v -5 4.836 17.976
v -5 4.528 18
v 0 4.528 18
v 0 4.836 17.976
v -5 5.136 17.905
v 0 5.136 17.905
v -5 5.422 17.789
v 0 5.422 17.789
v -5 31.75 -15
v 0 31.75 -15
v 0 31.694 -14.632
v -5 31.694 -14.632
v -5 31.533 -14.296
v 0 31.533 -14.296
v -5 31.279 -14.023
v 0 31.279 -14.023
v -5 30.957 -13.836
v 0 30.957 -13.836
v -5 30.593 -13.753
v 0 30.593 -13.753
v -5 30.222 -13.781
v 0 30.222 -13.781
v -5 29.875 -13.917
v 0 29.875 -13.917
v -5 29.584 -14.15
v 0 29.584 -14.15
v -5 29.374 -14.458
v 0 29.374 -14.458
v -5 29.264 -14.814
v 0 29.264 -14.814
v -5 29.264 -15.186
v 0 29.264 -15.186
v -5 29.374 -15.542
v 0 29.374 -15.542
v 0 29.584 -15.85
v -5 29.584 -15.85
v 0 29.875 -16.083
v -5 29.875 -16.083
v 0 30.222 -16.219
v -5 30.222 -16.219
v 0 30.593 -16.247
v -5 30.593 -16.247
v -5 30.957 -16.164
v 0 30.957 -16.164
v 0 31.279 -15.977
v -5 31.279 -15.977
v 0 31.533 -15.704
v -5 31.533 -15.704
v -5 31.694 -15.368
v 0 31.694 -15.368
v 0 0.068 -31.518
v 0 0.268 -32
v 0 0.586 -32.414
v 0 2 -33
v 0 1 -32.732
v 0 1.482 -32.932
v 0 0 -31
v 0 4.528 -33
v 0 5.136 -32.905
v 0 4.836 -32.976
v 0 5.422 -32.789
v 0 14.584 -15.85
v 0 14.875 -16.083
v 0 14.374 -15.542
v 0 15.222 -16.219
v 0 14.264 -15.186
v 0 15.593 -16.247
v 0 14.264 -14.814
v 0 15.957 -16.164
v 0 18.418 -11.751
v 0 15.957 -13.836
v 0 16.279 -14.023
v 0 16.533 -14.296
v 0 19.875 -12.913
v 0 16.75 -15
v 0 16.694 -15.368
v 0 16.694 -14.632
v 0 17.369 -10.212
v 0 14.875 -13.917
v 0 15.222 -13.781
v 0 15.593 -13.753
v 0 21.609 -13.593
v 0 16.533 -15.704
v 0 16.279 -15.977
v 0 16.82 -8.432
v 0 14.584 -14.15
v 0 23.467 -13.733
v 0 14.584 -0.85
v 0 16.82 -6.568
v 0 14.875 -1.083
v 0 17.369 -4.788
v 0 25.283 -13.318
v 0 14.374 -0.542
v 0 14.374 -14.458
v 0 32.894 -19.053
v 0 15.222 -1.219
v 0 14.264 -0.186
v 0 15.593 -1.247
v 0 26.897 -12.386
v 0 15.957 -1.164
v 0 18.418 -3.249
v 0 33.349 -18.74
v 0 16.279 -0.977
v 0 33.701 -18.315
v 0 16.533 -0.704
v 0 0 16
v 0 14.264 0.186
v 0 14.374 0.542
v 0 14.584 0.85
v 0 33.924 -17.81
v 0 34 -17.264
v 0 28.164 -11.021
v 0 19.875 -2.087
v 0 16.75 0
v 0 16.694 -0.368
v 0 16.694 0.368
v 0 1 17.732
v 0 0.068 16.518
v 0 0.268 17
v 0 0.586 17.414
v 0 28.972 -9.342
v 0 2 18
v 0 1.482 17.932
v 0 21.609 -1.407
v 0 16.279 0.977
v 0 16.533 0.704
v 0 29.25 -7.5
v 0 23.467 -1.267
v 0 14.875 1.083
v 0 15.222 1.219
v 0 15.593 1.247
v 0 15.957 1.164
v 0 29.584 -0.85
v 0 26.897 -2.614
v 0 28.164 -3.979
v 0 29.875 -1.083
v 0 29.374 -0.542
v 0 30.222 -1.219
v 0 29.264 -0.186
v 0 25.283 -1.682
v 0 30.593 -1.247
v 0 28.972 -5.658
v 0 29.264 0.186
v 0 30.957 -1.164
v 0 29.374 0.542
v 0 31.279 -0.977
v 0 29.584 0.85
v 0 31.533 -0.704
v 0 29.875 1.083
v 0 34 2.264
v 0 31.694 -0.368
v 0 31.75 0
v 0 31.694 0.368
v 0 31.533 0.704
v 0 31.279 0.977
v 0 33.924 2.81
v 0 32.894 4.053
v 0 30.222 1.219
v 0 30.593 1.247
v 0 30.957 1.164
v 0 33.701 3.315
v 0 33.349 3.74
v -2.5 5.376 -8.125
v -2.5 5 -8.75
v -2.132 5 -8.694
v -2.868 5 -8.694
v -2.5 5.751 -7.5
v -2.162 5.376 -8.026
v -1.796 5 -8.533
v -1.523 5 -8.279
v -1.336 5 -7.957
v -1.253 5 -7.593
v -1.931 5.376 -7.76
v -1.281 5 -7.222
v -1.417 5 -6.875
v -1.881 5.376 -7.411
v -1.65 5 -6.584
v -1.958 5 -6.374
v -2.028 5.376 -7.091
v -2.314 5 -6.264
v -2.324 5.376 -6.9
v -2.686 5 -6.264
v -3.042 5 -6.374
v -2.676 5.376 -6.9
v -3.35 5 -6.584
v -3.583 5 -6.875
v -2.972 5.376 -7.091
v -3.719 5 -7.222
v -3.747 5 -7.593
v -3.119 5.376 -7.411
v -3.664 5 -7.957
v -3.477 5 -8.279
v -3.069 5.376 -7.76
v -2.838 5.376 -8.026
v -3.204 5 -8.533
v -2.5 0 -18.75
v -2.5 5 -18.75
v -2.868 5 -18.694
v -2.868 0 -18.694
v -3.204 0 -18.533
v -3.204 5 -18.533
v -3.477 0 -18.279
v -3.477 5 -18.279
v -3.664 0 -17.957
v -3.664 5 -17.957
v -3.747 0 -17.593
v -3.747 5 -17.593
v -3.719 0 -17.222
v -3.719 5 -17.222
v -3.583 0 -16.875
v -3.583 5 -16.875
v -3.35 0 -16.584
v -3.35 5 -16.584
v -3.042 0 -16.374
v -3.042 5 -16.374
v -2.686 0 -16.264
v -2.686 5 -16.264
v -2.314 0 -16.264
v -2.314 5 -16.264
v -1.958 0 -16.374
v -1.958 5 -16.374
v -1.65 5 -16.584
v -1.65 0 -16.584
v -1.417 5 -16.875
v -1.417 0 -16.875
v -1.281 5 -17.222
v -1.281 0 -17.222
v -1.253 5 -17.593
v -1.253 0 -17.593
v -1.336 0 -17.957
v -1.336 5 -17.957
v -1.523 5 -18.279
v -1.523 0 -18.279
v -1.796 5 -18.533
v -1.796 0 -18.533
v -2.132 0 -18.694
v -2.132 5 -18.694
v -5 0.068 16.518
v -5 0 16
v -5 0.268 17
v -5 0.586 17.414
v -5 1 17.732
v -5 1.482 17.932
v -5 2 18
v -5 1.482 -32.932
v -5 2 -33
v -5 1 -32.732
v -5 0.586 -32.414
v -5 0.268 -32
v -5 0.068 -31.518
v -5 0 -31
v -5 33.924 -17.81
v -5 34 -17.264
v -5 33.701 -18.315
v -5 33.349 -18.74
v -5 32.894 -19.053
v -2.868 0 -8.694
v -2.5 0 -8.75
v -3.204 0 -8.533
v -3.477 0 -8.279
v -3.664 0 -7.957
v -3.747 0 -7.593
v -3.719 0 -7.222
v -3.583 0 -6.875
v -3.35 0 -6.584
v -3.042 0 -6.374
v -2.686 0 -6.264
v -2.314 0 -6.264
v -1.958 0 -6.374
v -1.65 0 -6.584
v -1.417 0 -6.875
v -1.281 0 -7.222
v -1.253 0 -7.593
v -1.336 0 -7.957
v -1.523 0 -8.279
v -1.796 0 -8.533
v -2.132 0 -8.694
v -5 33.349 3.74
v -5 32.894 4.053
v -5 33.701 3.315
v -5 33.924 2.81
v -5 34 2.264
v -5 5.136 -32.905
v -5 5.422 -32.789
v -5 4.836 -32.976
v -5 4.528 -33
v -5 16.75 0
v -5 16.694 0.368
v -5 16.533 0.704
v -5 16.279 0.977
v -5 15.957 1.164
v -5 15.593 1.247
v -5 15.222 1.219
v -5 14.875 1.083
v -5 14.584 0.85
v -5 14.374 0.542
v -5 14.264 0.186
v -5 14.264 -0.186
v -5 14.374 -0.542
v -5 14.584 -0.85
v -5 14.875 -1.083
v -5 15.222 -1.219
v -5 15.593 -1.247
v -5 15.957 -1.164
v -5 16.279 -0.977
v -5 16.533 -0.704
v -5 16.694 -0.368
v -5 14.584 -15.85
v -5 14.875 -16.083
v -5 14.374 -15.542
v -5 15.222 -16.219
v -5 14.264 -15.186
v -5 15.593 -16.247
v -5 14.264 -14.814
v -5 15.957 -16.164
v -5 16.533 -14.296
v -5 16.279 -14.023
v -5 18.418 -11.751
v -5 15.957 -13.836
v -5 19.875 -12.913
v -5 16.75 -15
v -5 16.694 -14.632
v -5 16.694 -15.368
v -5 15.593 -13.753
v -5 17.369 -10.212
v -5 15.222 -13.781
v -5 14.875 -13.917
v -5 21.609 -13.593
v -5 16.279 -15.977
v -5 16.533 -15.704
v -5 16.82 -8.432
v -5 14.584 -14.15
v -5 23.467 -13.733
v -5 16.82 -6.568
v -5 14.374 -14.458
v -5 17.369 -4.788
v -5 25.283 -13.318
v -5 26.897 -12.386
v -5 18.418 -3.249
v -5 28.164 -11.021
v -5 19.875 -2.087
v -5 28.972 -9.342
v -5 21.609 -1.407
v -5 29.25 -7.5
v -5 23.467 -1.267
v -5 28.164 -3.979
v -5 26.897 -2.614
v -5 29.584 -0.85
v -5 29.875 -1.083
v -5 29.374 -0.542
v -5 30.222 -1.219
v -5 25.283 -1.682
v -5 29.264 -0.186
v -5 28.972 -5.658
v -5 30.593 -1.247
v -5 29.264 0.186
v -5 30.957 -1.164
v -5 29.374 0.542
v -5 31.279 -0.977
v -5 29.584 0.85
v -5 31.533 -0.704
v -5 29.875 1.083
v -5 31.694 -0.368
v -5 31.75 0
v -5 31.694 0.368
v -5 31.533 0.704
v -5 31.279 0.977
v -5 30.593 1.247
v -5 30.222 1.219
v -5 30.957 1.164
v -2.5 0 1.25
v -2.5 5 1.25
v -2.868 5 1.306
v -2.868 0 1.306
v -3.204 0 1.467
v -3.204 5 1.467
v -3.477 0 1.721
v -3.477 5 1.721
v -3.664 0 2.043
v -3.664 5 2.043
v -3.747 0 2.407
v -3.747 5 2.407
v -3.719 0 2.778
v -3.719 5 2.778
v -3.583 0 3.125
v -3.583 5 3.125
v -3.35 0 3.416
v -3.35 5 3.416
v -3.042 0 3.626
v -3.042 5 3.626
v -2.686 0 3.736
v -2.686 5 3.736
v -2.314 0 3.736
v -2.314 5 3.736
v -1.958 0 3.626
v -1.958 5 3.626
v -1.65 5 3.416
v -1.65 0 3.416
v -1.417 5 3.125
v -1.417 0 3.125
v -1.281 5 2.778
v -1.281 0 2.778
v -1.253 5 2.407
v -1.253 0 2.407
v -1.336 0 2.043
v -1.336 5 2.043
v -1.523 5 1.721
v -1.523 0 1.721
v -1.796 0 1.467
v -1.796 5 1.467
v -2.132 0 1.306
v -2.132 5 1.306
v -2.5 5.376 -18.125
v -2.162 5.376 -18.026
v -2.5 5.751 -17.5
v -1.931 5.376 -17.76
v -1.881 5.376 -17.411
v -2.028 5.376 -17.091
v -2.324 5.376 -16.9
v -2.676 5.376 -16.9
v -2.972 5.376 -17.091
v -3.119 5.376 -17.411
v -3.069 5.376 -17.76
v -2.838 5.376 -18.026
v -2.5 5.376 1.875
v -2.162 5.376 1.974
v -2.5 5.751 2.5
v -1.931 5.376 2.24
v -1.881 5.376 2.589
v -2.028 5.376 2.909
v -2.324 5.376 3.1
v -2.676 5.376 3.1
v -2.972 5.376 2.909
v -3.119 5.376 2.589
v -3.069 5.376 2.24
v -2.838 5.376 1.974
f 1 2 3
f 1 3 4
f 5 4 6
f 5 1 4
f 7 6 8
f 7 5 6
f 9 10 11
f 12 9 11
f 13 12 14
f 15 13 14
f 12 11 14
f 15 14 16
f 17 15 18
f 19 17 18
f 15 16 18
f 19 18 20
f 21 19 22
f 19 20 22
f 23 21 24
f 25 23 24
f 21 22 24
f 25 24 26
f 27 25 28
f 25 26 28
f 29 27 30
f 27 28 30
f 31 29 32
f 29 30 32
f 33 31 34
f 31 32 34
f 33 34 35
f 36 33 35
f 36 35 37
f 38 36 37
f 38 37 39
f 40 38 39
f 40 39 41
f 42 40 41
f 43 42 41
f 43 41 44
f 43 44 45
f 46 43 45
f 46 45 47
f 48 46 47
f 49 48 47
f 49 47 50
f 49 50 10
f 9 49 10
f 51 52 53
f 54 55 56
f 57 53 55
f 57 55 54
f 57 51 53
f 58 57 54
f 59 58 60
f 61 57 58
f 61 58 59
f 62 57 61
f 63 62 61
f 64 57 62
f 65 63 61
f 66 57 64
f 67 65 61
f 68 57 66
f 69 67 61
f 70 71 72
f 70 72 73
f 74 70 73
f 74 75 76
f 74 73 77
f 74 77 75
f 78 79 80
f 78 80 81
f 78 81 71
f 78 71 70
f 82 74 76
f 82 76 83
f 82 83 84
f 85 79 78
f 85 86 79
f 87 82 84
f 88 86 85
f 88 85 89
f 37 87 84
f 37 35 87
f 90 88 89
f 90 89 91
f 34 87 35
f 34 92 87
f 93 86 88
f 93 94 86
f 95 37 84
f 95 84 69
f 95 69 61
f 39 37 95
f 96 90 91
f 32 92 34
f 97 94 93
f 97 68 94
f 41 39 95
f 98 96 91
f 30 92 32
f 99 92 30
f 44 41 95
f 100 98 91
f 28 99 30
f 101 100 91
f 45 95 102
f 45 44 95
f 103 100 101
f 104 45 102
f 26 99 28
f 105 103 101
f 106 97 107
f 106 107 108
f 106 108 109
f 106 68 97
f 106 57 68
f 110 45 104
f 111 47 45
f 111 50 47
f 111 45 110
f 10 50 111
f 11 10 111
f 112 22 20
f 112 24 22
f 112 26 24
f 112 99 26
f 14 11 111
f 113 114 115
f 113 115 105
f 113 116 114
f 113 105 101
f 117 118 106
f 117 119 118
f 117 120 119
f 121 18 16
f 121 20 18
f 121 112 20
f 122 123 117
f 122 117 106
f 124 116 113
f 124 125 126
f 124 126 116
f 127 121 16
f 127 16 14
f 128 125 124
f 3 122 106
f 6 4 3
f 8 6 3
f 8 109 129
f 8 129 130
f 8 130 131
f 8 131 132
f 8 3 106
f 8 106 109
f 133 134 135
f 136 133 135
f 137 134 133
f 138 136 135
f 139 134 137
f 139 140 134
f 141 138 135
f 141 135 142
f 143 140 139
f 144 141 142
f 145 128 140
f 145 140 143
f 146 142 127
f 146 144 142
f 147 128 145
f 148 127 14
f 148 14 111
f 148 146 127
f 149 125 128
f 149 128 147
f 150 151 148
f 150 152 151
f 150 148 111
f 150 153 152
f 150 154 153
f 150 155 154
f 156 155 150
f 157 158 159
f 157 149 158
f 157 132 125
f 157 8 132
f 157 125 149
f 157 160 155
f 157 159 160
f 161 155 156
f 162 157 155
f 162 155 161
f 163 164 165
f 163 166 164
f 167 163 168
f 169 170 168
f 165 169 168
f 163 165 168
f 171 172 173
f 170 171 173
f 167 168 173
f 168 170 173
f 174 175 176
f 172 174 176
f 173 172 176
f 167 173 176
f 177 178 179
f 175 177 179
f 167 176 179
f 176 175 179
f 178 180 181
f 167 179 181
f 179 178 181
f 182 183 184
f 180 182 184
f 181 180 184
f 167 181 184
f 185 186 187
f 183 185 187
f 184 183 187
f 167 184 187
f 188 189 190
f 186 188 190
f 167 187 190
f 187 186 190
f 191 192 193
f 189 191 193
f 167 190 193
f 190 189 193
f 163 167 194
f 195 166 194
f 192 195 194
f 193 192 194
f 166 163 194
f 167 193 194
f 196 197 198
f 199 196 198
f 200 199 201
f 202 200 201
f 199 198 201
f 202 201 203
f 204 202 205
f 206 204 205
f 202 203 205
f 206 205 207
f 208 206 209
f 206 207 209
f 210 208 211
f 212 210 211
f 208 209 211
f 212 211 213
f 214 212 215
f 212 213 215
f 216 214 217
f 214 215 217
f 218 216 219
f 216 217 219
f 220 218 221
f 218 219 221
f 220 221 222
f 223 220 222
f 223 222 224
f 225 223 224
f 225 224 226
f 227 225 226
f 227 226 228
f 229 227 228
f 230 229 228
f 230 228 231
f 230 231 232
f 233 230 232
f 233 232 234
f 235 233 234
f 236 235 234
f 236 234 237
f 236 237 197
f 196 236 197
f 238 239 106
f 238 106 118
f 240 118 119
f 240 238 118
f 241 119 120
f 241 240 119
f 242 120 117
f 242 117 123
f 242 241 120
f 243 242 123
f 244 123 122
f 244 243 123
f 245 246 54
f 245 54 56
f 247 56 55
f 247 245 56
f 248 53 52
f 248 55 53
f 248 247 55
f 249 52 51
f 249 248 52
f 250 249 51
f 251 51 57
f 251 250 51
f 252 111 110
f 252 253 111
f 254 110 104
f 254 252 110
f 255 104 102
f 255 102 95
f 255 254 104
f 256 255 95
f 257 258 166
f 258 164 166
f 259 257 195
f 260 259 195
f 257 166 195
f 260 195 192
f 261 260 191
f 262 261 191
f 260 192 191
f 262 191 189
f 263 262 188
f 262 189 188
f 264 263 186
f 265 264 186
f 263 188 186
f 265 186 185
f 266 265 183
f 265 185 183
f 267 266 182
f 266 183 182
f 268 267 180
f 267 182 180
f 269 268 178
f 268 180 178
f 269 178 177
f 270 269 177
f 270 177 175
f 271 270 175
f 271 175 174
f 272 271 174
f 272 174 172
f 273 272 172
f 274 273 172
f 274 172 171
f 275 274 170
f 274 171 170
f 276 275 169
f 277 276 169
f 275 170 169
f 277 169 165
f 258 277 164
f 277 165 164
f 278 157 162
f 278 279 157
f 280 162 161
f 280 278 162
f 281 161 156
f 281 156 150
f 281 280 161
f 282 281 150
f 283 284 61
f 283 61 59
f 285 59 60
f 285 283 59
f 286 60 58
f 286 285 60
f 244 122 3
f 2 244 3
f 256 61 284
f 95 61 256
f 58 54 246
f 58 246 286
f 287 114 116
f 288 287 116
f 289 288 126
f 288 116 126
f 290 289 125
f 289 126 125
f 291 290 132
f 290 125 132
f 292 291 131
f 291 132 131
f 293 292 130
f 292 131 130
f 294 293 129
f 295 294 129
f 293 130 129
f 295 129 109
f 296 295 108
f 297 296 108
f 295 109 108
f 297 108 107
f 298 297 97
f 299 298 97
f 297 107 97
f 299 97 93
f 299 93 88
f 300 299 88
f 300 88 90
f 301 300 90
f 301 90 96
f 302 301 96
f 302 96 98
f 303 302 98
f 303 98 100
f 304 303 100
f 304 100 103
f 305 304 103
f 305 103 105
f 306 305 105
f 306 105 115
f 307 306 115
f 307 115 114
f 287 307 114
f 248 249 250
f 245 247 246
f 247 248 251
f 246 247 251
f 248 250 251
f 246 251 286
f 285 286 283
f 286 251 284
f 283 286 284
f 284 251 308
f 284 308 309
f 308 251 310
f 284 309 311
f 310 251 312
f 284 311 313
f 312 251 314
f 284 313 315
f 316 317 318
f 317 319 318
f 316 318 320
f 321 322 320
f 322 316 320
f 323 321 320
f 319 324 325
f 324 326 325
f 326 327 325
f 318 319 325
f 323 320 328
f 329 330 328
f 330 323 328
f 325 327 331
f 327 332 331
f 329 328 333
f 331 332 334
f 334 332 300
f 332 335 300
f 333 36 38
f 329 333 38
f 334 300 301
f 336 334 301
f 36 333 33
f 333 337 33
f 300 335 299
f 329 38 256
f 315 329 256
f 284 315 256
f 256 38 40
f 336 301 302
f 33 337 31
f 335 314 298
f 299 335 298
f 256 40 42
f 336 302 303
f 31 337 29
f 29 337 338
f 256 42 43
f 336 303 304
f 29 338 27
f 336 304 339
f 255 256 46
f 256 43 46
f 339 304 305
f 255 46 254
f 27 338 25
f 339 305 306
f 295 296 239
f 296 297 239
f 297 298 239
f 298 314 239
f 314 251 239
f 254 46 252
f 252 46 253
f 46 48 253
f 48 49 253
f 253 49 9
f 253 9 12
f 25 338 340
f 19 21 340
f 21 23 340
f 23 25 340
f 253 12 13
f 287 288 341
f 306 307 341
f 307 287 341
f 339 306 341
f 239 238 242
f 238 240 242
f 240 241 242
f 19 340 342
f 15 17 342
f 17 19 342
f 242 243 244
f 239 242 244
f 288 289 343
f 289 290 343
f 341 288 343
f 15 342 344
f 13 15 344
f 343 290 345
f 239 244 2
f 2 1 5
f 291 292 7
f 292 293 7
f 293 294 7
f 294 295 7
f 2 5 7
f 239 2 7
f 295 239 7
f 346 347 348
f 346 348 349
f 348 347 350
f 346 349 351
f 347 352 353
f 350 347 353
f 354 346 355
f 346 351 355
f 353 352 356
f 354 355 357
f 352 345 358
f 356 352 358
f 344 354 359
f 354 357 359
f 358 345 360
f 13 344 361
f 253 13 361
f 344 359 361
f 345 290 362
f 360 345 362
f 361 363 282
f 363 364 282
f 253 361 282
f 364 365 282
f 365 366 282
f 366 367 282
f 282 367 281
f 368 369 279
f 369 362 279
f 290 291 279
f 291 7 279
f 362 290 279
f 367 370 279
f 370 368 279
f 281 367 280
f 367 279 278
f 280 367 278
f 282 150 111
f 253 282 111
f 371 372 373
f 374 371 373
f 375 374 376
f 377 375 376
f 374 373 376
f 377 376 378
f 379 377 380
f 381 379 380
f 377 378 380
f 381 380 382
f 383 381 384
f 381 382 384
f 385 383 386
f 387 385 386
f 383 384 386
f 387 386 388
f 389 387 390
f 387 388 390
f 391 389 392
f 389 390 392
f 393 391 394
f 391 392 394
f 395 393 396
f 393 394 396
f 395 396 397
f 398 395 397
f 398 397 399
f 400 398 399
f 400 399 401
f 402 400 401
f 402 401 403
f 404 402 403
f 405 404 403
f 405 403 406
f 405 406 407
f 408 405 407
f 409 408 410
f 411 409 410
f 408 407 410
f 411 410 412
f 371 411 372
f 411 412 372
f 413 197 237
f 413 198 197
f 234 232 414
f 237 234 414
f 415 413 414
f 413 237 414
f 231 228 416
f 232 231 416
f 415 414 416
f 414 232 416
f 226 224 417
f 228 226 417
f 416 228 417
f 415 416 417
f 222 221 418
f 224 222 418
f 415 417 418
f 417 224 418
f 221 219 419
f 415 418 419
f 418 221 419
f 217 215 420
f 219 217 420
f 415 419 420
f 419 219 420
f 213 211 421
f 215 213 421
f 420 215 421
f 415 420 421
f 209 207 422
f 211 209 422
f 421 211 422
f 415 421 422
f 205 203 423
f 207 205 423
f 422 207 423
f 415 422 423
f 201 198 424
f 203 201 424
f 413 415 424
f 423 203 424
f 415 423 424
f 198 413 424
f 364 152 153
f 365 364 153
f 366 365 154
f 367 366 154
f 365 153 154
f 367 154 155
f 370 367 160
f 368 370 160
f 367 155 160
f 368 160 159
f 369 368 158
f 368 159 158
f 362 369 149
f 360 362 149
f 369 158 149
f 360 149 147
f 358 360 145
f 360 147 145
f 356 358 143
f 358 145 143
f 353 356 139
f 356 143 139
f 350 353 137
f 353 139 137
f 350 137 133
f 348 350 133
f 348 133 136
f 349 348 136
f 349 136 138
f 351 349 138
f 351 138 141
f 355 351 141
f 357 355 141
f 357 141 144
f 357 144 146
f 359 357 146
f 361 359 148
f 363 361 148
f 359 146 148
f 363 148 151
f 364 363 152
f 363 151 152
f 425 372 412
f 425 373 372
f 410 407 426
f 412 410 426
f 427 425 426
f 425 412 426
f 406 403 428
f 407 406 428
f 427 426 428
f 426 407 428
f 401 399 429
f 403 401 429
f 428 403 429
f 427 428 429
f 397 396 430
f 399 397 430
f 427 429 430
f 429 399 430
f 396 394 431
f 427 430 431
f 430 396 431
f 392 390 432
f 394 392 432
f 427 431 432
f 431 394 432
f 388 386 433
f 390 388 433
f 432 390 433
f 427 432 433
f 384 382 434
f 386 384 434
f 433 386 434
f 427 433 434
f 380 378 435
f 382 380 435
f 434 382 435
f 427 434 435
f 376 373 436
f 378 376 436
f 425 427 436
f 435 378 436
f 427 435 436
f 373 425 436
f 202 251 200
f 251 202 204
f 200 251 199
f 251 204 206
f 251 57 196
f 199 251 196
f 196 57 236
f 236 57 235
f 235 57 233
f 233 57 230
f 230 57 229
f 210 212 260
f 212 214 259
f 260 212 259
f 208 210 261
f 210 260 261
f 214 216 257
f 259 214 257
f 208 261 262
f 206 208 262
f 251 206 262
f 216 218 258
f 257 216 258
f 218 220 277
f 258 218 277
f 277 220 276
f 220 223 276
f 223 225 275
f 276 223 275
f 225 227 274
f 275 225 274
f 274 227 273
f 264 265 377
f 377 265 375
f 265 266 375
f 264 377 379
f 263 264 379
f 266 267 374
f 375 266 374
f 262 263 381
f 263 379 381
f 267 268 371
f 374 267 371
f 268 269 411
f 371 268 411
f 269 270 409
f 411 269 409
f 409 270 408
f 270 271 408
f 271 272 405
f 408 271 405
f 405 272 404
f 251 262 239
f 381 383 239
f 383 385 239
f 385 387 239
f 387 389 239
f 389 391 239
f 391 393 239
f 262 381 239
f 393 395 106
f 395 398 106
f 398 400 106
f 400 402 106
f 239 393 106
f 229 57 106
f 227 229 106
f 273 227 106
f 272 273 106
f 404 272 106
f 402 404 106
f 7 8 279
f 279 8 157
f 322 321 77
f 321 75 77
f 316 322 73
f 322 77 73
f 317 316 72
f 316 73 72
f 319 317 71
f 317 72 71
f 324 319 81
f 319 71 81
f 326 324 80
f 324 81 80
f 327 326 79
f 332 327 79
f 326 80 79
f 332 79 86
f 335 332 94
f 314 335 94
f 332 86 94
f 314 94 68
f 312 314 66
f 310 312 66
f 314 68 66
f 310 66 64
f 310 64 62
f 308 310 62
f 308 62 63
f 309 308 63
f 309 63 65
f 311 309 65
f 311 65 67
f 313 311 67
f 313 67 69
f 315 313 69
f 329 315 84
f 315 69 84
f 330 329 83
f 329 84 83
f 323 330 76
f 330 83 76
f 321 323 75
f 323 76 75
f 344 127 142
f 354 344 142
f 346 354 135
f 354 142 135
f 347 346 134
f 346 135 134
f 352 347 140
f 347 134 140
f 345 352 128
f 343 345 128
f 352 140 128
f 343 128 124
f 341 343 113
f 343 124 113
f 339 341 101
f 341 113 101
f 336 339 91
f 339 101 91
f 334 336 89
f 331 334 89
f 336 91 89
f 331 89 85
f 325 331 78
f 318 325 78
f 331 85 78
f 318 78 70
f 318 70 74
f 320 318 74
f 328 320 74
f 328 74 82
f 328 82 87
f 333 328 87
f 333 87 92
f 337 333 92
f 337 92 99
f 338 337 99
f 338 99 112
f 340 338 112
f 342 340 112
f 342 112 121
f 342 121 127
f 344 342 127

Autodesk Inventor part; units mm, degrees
ref_plane "YZ Plane" through (0, 0, 0) normal (1, 0, 0) x (0, 1, 0)
ref_plane "XZ Plane" through (0, 0, 0) normal (0, 1, 0) x (-1, 0, 0)
ref_plane "XY Plane" through (0, 0, 0) normal (0, 0, 1) x (1, 0, 0)
sketch "スケッチ1" plane through (0, 0, 0) normal (1, 0, 0) x (0, 1, 0)
  line L0 (0, 0) -> (15, 0)
  line L1 (15, 0) -> (15, -15)
  line L2 (15, -15) -> (0, -15)
  line L3 (0, -15) -> (0, 0)
  line L4 (0, 18) -> (-5, 18)
  line L5 (-5, 18) -> (-5, -33)
  line L6 (-5, -33) -> (0, -33)
  line L7 (0, -33) -> (0, 18)
  line L8 (12, 3.5) -> (34, 3.5)
  line L9 (34, 3.5) -> (34, -18.5)
  line L10 (34, -18.5) -> (12, -18.5)
  line L11 (12, -18.5) -> (12, 3.5)
  circle A0 centre (15.5, 0) radius 1.25
  line L12 (23, 3.5) -> (23, -18.5)
  line L13 (34, -7.5) -> (12, -7.5)
  circle A1 centre (15.5, -15) radius 1.25
  circle A2 centre (30.5, 0) radius 1.25
  circle A3 centre (30.5, -15) radius 1.25
  circle A4 centre (23, -7.5) radius 6.25
  line L14 (0, 18) -> (34, 3.5)
  line L15 (34, -18.5) -> (0, -33)
  line L16 (0, 18) -> (5, 18)
  line L17 (5, 18) -> (34, 3.5)
  line L18 (0, -33) -> (5, -33)
  line L19 (5, -33) -> (34, -18.5)
  dimension "d0" = 15
  dimension "d1" = 15
  dimension "d2" = 5
  dimension "d3" = 51
  dimension "d4" = 18
  dimension "d5" = 0
  dimension "d6" = 22
  dimension "d7" = 22
  dimension "d8" = 3.5
  dimension "d9" = 3
  dimension "d10" = 2.5
  dimension "d11" = 3.5
  dimension "d12" = 3.5
  dimension "d13" = 12.5
  dimension "d18" = 5
extrude "押し出し1" add sketch "スケッチ1" against normal blind 5 contours L7 L14 L8 L11 L0 | L0 L11 L2 L3 | L11 L8 L12 A4 L13 L1 A0 L0 | L0 A0 L1 L13 L11 | L2 L11 L10 L15 L7 | L16 L17 L14 | L13 L1 A1 L2 L11 | L2 A1 L1 L13 A4 L12 L10 L11 | L15 L19 L18 | L9 L13 A4 L12 L8 | L10 L12 A4 L13 L9
fillet "フィレット2" radius 2 6 edges at (-2.5, 0, -33) (-2.5, 5, -33) (-2.5, 34, -18.5) (-2.5, 34, 3.5) (-2.5, 0, 18) (-2.5, 5, 18)
sketch "スケッチ3" plane through (0, 0, -31) normal (0, -1, 0) x (1, 0, 0)
  line L0 (0, 29.75) -> (0, 17.25) projected
  line L1 (0, 23.5) -> (-5, 23.5)
  line L2 (-5, 17.25) -> (-5, 29.75) projected
  line L3 (0, 47) -> (0, 0) projected
  line L4 (0, 33.5) -> (-5, 33.5)
  line L5 (0, 13.5) -> (-5, 13.5)
  point P0 (0, 31)
  point P1 (-2.5, 33.5)
  point P2 (-2.5, 23.5)
  point P3 (-2.5, 13.5)
  dimension "d20" = 10
  dimension "d21" = 2.5
  dimension "d22" = 2.5
hole "穴1" at (-2.5, 0, 2.5) at (-2.5, 0, -7.5) at (-2.5, 0, -17.5) direction (0, 1, 0) diameter 2.5 depth 5 tip angle 118
properties part number "belt_liner_v2_Plate_21" material "アルミニウム 6061"
